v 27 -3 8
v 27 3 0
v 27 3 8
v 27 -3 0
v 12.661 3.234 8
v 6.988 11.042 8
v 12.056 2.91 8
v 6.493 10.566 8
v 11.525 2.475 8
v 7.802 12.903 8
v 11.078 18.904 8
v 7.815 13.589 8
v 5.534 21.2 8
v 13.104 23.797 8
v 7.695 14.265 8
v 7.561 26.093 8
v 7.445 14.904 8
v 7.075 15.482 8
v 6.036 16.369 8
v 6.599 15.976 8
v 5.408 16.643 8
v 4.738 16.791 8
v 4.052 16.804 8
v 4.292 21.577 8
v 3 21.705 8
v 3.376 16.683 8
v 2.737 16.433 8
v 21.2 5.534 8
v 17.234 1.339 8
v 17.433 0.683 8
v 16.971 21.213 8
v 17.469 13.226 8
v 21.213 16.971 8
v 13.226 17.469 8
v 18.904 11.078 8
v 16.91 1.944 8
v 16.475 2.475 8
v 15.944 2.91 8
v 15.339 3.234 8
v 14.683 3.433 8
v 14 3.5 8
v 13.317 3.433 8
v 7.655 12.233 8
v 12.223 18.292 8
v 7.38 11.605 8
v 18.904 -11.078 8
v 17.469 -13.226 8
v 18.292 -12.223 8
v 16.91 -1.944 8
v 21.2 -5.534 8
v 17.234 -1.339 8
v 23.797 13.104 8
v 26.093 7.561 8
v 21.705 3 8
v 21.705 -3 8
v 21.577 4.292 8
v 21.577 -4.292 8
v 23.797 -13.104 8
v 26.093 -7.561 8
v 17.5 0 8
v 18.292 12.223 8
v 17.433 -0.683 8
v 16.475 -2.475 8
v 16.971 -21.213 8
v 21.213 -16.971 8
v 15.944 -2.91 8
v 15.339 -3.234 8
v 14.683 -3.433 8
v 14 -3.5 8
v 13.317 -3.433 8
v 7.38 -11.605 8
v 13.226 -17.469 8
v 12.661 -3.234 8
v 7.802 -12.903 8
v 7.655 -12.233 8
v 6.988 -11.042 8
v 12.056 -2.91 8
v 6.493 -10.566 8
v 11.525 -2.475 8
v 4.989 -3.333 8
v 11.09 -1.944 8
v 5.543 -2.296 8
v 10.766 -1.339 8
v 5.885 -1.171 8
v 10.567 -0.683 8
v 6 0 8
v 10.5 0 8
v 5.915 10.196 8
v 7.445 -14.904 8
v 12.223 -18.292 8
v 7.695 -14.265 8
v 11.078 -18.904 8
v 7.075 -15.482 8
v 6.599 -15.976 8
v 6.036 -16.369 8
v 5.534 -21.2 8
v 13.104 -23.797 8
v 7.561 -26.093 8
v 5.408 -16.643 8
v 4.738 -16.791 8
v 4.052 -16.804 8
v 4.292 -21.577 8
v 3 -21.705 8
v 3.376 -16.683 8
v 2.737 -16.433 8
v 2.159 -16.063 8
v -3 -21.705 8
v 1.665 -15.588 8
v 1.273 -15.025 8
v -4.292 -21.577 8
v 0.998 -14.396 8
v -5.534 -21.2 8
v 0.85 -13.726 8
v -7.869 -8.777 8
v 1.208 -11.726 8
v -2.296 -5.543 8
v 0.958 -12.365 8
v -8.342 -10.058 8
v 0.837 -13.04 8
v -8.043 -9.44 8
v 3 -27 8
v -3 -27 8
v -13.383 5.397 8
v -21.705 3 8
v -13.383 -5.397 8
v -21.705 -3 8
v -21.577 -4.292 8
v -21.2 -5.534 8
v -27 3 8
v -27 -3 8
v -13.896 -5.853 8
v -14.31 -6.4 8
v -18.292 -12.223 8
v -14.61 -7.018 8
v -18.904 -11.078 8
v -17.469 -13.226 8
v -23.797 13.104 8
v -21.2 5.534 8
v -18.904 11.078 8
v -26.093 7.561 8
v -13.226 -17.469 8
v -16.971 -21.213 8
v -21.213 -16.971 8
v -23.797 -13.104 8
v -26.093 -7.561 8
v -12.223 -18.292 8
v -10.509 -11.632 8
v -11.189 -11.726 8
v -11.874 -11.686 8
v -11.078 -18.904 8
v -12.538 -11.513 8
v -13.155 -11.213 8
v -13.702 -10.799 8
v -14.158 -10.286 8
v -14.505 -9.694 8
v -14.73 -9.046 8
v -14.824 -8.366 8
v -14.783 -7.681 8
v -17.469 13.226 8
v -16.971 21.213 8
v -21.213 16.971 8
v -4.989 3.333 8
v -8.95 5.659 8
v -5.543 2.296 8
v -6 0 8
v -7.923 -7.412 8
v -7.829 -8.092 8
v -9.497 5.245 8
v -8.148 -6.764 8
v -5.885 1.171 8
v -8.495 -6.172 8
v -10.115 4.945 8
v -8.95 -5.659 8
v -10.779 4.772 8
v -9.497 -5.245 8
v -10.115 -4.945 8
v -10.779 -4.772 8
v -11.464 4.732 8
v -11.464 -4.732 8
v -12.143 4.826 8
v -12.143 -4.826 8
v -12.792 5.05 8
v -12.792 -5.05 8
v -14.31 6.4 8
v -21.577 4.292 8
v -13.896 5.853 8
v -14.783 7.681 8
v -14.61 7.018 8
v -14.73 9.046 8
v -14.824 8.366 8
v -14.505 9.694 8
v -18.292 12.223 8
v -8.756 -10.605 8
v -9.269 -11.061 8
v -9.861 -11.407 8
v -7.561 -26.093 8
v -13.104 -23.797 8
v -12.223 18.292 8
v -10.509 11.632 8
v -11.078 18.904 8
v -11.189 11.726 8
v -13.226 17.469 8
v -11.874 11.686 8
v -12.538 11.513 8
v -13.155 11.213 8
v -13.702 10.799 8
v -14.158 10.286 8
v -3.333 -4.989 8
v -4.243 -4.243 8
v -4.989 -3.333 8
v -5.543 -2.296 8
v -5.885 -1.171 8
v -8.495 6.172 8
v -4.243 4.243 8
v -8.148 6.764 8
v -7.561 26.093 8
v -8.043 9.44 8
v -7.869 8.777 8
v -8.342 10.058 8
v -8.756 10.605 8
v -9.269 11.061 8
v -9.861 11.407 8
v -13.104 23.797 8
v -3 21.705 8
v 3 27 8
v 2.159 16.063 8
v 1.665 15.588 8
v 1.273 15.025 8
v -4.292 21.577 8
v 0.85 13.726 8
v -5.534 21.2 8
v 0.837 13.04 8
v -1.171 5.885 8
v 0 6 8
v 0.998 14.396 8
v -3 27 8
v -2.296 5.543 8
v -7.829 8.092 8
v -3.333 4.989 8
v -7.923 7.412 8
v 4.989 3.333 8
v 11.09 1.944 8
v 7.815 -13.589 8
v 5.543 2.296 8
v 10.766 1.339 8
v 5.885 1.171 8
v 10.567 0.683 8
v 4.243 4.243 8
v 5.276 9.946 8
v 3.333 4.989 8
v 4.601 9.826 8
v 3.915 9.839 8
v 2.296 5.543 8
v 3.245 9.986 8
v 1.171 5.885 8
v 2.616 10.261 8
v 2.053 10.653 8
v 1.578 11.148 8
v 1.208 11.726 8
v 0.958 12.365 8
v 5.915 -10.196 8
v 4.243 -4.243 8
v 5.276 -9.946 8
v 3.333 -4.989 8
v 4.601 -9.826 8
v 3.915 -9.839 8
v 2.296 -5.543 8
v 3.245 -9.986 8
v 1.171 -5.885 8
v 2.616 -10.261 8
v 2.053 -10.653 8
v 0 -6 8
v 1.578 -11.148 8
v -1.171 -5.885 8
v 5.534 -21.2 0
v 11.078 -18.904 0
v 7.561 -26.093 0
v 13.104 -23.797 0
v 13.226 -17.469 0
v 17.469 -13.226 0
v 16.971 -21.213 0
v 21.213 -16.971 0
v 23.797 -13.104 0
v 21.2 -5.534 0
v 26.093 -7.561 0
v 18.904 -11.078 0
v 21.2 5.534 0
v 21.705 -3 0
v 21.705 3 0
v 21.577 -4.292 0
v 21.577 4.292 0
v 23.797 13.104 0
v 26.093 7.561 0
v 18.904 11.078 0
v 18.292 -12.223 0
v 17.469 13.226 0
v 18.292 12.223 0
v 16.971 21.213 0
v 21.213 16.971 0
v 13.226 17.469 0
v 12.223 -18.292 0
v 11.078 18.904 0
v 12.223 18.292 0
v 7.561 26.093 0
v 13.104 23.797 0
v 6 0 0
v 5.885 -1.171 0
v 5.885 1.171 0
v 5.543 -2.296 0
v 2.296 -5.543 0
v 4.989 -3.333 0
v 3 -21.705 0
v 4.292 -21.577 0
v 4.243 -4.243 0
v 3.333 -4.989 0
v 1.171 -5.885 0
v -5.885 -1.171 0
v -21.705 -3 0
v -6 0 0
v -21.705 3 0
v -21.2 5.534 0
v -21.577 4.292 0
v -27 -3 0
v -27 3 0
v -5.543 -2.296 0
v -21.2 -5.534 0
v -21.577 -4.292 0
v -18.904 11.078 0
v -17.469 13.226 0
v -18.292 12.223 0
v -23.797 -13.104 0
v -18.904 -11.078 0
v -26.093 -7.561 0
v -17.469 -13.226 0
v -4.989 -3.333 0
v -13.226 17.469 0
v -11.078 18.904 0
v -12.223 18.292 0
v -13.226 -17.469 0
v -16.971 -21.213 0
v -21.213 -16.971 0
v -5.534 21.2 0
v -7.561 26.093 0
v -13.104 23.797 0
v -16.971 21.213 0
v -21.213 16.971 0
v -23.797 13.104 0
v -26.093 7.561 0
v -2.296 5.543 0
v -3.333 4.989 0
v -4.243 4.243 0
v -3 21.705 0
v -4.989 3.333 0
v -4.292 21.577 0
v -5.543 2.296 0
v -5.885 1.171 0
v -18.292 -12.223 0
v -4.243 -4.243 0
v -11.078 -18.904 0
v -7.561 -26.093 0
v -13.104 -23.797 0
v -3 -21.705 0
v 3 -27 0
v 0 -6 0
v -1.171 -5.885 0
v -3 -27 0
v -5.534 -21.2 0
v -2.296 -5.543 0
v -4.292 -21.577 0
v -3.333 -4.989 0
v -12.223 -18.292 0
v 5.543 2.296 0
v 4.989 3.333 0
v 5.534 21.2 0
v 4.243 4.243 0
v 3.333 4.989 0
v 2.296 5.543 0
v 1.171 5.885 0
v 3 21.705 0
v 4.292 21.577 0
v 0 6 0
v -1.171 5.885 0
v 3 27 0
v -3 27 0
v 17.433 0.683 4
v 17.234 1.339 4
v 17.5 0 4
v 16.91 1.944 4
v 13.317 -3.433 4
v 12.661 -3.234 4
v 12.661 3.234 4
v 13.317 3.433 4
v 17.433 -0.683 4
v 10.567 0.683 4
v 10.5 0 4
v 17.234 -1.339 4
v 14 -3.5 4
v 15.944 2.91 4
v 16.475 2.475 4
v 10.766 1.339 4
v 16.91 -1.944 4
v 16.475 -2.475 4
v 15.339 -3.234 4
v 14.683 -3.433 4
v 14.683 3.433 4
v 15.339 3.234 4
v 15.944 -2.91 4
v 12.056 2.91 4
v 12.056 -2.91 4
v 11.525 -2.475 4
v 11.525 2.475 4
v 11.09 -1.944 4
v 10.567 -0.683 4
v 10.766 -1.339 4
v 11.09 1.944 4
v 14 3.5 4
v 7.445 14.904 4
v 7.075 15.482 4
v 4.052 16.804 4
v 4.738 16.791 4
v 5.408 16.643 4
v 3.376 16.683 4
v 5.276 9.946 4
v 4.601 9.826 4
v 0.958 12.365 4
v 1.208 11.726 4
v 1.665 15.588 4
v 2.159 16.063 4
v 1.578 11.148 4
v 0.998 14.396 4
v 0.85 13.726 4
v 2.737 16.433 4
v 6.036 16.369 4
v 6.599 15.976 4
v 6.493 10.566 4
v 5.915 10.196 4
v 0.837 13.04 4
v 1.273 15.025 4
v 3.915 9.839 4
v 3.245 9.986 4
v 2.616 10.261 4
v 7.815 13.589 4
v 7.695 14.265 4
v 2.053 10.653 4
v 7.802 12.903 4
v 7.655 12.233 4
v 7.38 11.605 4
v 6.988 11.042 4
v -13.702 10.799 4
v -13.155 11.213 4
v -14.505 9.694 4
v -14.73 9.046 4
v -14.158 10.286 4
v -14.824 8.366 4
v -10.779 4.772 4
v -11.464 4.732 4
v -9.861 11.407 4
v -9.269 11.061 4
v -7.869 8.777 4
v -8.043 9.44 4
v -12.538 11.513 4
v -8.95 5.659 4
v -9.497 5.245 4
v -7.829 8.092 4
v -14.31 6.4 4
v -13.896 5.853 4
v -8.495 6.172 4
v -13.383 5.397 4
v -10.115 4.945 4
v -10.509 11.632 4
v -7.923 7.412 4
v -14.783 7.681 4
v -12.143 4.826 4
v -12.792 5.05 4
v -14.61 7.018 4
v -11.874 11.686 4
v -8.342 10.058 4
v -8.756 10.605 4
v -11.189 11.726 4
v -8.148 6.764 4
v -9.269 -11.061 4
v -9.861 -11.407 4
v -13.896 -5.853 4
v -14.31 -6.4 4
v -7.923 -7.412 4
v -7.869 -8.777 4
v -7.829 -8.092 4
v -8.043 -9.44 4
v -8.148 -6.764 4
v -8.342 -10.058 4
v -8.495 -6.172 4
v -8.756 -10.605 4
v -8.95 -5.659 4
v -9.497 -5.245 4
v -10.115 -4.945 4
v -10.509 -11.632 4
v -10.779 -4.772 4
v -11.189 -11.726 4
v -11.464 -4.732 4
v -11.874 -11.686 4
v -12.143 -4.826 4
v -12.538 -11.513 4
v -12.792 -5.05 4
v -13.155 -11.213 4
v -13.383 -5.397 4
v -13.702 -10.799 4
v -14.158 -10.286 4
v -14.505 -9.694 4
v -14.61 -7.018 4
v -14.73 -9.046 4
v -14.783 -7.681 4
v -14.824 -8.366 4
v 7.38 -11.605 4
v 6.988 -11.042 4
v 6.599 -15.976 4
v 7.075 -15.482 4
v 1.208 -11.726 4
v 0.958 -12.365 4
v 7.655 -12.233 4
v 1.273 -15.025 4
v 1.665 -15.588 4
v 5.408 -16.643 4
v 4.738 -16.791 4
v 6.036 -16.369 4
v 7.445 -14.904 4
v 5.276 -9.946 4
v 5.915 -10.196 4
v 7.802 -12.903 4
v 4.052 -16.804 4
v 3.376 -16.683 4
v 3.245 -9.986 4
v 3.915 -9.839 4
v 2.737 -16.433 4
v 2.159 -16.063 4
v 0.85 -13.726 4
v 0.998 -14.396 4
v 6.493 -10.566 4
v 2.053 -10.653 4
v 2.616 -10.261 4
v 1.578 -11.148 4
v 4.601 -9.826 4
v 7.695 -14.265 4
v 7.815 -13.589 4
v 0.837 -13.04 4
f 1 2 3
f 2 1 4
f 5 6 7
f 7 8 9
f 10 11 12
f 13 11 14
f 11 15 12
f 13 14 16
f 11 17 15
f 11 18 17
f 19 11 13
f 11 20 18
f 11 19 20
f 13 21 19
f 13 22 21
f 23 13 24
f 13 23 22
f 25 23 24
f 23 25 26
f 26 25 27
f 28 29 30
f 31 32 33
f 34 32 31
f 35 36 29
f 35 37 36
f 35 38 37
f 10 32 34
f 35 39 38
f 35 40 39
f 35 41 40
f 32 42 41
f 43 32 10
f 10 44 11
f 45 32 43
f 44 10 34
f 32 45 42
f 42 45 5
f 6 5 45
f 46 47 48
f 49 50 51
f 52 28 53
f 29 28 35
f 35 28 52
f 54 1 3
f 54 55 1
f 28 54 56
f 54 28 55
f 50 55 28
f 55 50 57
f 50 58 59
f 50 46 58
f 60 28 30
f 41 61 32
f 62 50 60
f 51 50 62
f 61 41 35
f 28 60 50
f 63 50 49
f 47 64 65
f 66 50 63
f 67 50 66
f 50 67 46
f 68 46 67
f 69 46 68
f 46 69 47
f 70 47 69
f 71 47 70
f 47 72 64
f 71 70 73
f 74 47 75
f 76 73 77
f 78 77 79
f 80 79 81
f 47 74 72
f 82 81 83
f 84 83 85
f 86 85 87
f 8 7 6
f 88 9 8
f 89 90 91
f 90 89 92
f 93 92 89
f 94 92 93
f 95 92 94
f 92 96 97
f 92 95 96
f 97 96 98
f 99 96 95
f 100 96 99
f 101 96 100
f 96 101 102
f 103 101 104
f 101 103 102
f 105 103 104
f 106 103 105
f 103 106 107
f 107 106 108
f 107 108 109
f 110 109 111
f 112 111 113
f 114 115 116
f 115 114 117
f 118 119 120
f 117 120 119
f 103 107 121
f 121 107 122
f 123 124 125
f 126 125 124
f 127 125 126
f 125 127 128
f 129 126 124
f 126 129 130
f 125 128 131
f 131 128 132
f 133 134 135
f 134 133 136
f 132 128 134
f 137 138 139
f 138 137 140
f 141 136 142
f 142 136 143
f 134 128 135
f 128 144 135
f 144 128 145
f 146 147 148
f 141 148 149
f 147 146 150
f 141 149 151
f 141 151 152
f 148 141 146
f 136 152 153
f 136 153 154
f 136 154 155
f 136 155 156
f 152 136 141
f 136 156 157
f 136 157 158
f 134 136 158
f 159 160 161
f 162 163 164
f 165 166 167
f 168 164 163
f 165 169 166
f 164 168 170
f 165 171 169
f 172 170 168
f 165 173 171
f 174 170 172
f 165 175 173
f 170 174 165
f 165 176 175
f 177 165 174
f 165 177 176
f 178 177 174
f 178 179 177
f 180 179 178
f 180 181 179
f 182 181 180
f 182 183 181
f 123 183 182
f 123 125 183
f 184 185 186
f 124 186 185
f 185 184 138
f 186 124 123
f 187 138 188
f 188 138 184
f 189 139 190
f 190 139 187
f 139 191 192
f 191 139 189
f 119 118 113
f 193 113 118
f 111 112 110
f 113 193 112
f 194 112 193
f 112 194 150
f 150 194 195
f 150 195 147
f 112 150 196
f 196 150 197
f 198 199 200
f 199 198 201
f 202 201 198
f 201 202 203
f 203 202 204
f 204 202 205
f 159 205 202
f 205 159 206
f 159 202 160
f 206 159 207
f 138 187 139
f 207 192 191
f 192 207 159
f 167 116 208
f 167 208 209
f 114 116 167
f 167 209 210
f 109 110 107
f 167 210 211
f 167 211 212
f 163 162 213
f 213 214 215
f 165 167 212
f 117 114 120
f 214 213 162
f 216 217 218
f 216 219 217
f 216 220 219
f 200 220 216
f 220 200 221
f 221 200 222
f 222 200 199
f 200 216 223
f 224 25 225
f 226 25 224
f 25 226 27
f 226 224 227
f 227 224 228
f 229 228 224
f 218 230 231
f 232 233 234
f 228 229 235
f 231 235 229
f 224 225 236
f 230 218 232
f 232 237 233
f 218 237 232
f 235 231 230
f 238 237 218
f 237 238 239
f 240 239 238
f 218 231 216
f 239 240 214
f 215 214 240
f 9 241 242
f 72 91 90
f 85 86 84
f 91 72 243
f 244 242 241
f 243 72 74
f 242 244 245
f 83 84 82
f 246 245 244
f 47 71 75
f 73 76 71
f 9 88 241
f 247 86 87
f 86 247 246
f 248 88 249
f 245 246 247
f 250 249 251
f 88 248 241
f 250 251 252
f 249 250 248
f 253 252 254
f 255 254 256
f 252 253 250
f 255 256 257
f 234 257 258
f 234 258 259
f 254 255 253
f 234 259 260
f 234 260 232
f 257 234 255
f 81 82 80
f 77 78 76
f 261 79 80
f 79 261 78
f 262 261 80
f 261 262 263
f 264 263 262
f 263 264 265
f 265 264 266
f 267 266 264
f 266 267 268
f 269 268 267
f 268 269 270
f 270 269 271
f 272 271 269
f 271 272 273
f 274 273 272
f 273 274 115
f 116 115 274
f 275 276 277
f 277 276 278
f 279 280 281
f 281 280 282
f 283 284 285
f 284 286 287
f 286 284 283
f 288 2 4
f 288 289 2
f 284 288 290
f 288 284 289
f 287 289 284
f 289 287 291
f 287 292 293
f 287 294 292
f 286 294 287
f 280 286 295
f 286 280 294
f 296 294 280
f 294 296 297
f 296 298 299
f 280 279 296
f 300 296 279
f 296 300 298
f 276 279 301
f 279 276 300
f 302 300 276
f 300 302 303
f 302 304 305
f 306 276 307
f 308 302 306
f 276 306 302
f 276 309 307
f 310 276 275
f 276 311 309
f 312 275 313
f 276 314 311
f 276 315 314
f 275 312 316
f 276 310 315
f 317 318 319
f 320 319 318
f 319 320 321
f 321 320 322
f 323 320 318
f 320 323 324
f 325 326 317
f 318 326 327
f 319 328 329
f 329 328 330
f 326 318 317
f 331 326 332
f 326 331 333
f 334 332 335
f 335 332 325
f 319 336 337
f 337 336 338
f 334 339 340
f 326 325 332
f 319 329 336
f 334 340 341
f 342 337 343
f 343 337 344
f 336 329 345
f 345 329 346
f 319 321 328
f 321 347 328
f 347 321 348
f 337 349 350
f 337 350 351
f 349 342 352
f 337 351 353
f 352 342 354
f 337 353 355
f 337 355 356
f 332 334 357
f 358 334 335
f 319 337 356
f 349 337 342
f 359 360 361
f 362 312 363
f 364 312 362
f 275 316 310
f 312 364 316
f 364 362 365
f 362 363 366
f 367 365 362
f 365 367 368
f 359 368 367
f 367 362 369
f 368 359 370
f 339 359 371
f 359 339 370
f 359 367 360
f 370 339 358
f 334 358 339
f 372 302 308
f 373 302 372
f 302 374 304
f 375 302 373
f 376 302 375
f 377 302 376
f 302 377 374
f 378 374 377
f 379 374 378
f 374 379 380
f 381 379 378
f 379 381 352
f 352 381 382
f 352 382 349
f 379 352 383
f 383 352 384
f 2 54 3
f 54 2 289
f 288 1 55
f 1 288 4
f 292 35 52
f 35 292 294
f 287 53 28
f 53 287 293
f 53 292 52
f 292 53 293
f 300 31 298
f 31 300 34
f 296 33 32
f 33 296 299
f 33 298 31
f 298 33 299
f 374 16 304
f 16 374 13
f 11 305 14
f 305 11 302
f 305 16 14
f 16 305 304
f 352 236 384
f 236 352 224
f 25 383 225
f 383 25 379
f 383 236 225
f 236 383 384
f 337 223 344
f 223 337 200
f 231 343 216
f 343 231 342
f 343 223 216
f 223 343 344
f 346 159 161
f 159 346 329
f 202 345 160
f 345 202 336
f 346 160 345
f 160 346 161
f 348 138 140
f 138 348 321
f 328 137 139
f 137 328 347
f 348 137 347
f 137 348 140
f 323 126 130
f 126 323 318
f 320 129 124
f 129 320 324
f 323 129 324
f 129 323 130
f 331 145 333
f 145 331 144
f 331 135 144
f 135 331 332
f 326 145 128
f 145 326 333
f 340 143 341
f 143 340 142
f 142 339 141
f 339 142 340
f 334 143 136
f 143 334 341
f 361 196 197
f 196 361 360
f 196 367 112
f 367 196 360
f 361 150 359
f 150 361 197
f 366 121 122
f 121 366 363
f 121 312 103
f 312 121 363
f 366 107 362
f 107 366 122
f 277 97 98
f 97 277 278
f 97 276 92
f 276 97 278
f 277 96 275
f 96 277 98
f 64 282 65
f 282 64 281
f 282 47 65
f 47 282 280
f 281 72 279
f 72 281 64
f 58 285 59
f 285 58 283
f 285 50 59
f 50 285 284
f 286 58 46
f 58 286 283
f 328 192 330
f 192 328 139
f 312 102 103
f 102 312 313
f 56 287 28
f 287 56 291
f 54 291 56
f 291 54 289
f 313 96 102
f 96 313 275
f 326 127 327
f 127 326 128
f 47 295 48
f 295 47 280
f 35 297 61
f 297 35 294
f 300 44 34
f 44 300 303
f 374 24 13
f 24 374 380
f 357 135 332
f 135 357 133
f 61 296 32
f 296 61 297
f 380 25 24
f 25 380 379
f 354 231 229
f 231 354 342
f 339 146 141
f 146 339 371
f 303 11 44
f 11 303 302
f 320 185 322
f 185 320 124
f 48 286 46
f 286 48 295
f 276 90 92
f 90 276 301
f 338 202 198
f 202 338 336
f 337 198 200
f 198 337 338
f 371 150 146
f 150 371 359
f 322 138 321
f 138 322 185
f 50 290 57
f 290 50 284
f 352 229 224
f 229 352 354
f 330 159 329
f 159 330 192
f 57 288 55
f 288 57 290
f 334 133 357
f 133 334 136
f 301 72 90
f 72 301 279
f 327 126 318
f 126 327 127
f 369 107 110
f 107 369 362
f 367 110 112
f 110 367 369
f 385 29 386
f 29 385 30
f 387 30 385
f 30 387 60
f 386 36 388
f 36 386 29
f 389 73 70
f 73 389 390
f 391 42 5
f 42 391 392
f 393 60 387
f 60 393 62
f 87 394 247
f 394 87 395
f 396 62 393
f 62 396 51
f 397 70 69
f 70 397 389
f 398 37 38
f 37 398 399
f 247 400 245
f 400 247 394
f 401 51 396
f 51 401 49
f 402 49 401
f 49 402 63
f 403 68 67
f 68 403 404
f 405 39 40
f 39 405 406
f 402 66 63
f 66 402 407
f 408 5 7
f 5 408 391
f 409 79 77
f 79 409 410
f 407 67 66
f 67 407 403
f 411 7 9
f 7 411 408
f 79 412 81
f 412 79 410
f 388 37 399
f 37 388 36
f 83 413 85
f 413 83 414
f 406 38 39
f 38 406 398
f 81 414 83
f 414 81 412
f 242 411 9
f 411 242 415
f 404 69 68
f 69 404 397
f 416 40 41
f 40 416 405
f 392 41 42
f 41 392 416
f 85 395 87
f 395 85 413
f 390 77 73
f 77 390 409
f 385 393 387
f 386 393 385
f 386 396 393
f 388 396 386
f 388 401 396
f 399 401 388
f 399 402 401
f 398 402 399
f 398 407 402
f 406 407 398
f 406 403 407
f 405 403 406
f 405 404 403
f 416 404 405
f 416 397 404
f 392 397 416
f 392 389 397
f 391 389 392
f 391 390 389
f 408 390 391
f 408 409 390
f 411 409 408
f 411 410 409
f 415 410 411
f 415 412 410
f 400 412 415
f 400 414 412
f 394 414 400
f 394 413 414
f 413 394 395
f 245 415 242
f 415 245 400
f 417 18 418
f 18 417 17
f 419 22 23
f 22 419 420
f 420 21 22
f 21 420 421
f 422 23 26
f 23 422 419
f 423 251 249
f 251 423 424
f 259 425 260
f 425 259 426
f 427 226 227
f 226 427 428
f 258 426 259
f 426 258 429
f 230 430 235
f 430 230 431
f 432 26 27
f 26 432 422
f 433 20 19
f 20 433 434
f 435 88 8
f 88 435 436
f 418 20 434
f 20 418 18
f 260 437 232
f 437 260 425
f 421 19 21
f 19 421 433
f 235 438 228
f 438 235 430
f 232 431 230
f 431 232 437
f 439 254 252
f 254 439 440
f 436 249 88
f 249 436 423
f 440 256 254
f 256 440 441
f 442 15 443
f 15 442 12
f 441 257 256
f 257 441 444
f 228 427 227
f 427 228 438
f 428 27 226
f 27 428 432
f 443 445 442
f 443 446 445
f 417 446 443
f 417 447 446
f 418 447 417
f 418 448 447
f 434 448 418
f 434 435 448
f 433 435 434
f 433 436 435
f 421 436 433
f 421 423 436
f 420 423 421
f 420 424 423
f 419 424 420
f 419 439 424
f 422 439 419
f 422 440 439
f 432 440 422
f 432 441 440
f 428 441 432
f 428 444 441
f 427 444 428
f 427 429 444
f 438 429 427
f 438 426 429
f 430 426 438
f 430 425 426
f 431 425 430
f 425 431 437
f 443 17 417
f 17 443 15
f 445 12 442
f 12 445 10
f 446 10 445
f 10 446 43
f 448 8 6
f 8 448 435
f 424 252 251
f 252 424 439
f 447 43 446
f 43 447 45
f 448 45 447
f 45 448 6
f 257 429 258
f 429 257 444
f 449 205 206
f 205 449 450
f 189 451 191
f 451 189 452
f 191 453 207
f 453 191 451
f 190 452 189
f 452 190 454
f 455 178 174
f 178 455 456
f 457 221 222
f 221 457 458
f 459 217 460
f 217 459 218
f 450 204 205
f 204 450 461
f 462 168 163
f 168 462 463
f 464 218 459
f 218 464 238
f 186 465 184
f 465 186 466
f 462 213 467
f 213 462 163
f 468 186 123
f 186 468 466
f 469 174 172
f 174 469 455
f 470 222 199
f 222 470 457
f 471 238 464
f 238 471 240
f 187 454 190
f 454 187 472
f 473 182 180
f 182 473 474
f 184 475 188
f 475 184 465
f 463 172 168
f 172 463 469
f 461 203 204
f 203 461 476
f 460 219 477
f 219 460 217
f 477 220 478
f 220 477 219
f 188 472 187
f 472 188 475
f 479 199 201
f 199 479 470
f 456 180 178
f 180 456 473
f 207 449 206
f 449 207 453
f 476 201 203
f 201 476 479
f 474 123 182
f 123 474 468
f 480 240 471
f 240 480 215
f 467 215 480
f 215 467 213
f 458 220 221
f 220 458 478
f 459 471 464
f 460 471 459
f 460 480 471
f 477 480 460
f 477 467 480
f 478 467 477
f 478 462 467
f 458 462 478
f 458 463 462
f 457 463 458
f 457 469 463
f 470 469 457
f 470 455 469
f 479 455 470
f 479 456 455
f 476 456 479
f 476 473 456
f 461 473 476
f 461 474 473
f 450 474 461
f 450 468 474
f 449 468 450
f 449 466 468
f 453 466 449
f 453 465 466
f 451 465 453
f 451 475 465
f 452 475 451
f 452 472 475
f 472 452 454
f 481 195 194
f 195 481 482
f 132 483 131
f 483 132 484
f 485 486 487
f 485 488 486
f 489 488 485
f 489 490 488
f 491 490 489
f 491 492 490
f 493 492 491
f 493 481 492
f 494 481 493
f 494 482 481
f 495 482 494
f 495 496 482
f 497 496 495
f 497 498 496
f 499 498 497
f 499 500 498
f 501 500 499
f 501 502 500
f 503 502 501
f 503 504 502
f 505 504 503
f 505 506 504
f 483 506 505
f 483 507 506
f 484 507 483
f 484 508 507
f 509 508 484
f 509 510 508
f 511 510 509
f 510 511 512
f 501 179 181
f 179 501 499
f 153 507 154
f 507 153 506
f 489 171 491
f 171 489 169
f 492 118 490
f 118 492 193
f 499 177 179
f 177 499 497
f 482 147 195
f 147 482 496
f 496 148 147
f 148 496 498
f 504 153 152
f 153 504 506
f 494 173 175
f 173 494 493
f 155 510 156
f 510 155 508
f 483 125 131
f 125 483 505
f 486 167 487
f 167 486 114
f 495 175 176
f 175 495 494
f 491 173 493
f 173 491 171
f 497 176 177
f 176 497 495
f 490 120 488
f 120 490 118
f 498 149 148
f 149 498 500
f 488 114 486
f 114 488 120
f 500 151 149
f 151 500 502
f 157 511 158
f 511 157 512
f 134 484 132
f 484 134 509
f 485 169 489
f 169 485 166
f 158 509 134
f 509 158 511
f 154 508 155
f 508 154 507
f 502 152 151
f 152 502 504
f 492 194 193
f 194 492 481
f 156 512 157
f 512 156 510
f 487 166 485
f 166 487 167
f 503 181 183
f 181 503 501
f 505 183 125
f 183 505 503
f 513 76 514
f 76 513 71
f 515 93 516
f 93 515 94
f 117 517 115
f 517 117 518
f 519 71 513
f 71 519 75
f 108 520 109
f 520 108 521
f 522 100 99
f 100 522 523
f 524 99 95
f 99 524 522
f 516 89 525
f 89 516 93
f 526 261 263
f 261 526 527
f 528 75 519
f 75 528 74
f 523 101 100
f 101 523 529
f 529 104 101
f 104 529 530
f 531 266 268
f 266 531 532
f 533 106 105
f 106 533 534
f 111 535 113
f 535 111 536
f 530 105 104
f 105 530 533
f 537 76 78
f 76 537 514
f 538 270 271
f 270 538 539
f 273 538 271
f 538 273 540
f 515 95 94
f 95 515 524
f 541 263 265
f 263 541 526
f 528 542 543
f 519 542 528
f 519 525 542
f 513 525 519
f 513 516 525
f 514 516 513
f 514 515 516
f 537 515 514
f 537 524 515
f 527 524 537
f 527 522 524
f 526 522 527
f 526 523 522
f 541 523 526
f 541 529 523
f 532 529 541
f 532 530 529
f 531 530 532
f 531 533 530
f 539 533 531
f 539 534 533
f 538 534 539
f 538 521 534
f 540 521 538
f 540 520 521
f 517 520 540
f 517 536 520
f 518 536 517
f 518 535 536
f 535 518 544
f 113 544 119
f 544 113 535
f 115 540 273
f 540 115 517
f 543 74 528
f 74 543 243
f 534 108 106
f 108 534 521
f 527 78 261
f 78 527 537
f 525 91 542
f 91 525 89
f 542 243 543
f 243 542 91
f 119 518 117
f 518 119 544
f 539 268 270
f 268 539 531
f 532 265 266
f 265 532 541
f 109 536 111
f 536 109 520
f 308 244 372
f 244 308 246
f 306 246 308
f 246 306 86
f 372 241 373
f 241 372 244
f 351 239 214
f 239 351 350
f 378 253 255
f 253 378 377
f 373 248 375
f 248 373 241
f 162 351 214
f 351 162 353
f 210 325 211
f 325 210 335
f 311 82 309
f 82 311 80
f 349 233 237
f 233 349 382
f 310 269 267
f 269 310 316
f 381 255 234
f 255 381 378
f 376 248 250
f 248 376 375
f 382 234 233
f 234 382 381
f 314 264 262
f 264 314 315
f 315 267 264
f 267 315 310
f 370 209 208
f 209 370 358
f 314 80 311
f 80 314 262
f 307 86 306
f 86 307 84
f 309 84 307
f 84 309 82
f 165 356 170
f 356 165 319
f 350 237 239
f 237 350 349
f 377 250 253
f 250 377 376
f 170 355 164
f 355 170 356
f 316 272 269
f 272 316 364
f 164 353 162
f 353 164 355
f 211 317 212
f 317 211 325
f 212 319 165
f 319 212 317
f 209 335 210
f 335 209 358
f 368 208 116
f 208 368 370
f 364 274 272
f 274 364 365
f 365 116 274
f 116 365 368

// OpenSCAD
$fn = 32;

// ----------------------------------------------------------------------
// Spur blank: lightened gear blank
// ----------------------------------------------------------------------

// --- parameters (mm) ---
disc_r = 22;              // blank root radius
disc_t = 8;               // blank thickness
n_teeth = 16;             // stub tooth count
tooth_w = 6;              // tooth width at the root
tooth_h = 5;              // tooth height above the root
bore_r = 6;               // central bore radius
ring_r = 14;              // lightening pocket ring radius
pocket_r = 3.5;           // lightening pocket radius

out_r = disc_r + tooth_h;  // tip radius
bbox_x = 54.0;  // measured width over the teeth
bbox_y = 54.0;  // measured depth over the teeth

difference() {
union() {
  cylinder(r = disc_r, h = disc_t);
  for (i = [0 : n_teeth - 1])
    rotate([0, 0, i * 360 / n_teeth])
      translate([disc_r - 1, -tooth_w / 2, 0])
        cube([tooth_h + 1, tooth_w, disc_t]);
}
  translate([0, 0, -1]) cylinder(r = bore_r, h = disc_t + 2);
  for (i = [0 : 5])
    rotate([0, 0, i * 72])
      translate([ring_r, 0, disc_t - 4])
        cylinder(r = pocket_r, h = 5);
}
